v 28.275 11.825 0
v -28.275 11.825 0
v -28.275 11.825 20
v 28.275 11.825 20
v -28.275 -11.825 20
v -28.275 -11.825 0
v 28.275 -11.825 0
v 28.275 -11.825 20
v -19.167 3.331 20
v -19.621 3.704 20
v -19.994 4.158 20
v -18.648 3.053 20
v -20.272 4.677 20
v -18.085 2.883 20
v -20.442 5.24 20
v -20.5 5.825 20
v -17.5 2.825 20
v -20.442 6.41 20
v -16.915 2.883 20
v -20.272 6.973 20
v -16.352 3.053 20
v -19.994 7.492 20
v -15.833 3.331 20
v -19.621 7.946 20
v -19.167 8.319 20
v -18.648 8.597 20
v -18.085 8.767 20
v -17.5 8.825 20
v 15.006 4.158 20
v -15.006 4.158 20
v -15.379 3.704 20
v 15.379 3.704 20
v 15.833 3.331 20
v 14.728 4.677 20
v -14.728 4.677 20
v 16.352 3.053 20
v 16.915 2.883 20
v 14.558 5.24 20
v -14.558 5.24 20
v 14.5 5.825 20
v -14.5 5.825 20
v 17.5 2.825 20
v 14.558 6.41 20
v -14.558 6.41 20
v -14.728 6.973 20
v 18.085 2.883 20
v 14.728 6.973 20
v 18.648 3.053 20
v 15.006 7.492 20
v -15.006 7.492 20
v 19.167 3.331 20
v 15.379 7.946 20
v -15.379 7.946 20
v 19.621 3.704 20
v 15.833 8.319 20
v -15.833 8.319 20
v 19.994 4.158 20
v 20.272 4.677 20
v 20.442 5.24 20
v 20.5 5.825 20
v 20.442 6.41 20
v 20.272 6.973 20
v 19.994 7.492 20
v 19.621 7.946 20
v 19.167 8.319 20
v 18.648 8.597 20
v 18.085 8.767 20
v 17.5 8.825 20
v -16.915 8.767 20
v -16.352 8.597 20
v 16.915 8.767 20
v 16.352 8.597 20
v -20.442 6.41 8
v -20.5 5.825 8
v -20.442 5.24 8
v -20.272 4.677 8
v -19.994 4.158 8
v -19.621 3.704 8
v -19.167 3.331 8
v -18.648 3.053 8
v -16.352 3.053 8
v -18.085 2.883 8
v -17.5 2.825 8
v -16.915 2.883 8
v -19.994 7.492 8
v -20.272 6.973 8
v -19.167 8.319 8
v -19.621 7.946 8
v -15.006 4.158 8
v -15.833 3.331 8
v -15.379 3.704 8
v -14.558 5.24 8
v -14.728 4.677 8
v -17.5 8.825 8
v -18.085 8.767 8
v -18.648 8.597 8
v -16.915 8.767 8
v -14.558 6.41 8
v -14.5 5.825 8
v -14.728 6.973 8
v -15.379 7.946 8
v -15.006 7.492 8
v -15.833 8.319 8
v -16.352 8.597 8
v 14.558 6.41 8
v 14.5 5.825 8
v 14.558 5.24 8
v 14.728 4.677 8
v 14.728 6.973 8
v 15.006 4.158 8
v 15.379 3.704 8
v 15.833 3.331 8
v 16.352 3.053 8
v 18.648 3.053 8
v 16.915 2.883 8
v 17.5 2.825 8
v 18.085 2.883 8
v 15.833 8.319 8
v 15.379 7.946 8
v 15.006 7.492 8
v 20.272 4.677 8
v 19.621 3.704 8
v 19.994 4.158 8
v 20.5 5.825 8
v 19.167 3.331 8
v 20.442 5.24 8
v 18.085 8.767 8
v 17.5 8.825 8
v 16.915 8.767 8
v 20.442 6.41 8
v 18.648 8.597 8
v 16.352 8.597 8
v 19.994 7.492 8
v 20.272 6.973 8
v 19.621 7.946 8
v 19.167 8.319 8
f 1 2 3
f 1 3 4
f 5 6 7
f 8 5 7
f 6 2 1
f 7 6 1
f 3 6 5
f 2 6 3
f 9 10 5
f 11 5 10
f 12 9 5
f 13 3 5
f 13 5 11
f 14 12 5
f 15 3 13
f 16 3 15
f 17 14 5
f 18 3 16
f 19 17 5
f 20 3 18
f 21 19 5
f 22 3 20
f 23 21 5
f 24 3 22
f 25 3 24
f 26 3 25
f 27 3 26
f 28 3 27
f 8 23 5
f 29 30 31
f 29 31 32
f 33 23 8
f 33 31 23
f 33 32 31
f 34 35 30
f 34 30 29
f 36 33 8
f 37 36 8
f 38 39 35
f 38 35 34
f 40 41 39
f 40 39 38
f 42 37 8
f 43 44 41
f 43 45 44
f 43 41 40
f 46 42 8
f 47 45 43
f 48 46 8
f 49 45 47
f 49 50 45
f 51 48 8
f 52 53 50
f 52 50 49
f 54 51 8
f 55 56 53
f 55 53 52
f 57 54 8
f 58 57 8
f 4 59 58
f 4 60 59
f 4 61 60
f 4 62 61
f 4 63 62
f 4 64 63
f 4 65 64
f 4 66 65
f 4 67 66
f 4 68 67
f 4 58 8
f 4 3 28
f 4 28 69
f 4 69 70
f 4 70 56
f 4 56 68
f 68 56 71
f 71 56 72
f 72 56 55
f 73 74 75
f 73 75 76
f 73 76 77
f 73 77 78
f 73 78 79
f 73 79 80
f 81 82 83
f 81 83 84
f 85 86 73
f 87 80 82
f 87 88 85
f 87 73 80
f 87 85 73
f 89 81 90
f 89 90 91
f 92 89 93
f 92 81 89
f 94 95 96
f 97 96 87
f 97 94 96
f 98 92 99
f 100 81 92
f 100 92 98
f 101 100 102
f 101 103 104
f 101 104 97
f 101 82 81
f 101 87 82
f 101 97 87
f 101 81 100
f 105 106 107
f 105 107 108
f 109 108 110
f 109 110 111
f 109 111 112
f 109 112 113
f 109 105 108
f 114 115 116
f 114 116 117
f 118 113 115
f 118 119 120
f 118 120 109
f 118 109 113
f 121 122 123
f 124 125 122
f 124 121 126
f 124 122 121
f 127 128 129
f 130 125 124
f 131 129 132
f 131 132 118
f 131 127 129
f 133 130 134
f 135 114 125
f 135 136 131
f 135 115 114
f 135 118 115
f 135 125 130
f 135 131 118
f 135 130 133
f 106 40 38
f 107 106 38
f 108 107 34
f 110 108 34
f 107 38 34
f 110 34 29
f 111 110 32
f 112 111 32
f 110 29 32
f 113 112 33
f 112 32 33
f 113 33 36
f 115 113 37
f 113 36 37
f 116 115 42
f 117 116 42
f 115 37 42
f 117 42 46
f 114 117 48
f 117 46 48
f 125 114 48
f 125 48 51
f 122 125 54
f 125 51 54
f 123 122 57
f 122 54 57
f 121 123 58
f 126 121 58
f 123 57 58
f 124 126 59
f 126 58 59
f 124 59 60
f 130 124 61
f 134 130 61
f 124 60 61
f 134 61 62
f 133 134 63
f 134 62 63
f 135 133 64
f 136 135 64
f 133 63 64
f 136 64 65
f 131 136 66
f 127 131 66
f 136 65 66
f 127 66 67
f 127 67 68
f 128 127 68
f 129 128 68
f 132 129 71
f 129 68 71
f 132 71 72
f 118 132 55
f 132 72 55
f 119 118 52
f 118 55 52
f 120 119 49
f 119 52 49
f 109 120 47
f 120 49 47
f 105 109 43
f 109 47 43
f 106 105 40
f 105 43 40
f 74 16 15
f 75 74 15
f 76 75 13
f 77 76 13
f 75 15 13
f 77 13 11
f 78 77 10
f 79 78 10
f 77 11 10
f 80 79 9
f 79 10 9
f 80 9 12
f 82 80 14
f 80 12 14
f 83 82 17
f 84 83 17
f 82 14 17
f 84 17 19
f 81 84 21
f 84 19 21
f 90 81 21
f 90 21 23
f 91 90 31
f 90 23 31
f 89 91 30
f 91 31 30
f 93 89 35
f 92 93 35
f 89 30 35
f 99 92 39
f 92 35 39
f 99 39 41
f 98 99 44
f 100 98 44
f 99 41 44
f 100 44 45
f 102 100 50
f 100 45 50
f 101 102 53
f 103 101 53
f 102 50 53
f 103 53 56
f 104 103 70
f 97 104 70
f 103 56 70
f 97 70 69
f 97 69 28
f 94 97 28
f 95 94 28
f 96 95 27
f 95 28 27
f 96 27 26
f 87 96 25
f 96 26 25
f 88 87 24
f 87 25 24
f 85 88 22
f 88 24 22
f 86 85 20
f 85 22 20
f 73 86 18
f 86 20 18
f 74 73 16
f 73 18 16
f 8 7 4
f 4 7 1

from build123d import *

# Parameters (mm, degrees)
SKETCH1_W           = 56.55
SKETCH1_H           = 23.65
BOSS_EXTRUDE1_DEPTH = 20
CUT_EXTRUDE1_DEPTH  = 12


with BuildPart() as part:
    # Sketch1 → Boss-Extrude1 (new body)
    with BuildSketch(Plane.XY):
        Rectangle(SKETCH1_W, SKETCH1_H)
    extrude(amount=BOSS_EXTRUDE1_DEPTH)

    # Sketch2 → Cut-Extrude1 (cut)
    with BuildSketch(Plane.XY.offset(20)):
        with BuildLine():
            Line((-20.5, 5.825), (-17.5, 5.825))
            Line((-17.5, 5.825), (-14.5, 5.825))
            ThreePointArc((-14.5, 5.825), (-17.5, 8.825), (-20.5, 5.825))
        make_face()
        with BuildLine():
            Line((-14.5, 5.825), (-17.5, 5.825))
            Line((-17.5, 5.825), (-20.5, 5.825))
            ThreePointArc((-20.5, 5.825), (-17.5, 2.825), (-14.5, 5.825))
        make_face()
        with BuildLine():
            ThreePointArc((20.5, 5.825), (17.5, 8.825), (14.5, 5.825))
            Line((14.5, 5.825), (17.5, 5.825))
            Line((17.5, 5.825), (20.5, 5.825))
        make_face()
        with BuildLine():
            Line((17.5, 5.825), (14.5, 5.825))
            ThreePointArc((14.5, 5.825), (17.5, 2.825), (20.5, 5.825))
            Line((20.5, 5.825), (17.5, 5.825))
        make_face()
    extrude(amount=-CUT_EXTRUDE1_DEPTH, mode=Mode.SUBTRACT)


solid = part.part
